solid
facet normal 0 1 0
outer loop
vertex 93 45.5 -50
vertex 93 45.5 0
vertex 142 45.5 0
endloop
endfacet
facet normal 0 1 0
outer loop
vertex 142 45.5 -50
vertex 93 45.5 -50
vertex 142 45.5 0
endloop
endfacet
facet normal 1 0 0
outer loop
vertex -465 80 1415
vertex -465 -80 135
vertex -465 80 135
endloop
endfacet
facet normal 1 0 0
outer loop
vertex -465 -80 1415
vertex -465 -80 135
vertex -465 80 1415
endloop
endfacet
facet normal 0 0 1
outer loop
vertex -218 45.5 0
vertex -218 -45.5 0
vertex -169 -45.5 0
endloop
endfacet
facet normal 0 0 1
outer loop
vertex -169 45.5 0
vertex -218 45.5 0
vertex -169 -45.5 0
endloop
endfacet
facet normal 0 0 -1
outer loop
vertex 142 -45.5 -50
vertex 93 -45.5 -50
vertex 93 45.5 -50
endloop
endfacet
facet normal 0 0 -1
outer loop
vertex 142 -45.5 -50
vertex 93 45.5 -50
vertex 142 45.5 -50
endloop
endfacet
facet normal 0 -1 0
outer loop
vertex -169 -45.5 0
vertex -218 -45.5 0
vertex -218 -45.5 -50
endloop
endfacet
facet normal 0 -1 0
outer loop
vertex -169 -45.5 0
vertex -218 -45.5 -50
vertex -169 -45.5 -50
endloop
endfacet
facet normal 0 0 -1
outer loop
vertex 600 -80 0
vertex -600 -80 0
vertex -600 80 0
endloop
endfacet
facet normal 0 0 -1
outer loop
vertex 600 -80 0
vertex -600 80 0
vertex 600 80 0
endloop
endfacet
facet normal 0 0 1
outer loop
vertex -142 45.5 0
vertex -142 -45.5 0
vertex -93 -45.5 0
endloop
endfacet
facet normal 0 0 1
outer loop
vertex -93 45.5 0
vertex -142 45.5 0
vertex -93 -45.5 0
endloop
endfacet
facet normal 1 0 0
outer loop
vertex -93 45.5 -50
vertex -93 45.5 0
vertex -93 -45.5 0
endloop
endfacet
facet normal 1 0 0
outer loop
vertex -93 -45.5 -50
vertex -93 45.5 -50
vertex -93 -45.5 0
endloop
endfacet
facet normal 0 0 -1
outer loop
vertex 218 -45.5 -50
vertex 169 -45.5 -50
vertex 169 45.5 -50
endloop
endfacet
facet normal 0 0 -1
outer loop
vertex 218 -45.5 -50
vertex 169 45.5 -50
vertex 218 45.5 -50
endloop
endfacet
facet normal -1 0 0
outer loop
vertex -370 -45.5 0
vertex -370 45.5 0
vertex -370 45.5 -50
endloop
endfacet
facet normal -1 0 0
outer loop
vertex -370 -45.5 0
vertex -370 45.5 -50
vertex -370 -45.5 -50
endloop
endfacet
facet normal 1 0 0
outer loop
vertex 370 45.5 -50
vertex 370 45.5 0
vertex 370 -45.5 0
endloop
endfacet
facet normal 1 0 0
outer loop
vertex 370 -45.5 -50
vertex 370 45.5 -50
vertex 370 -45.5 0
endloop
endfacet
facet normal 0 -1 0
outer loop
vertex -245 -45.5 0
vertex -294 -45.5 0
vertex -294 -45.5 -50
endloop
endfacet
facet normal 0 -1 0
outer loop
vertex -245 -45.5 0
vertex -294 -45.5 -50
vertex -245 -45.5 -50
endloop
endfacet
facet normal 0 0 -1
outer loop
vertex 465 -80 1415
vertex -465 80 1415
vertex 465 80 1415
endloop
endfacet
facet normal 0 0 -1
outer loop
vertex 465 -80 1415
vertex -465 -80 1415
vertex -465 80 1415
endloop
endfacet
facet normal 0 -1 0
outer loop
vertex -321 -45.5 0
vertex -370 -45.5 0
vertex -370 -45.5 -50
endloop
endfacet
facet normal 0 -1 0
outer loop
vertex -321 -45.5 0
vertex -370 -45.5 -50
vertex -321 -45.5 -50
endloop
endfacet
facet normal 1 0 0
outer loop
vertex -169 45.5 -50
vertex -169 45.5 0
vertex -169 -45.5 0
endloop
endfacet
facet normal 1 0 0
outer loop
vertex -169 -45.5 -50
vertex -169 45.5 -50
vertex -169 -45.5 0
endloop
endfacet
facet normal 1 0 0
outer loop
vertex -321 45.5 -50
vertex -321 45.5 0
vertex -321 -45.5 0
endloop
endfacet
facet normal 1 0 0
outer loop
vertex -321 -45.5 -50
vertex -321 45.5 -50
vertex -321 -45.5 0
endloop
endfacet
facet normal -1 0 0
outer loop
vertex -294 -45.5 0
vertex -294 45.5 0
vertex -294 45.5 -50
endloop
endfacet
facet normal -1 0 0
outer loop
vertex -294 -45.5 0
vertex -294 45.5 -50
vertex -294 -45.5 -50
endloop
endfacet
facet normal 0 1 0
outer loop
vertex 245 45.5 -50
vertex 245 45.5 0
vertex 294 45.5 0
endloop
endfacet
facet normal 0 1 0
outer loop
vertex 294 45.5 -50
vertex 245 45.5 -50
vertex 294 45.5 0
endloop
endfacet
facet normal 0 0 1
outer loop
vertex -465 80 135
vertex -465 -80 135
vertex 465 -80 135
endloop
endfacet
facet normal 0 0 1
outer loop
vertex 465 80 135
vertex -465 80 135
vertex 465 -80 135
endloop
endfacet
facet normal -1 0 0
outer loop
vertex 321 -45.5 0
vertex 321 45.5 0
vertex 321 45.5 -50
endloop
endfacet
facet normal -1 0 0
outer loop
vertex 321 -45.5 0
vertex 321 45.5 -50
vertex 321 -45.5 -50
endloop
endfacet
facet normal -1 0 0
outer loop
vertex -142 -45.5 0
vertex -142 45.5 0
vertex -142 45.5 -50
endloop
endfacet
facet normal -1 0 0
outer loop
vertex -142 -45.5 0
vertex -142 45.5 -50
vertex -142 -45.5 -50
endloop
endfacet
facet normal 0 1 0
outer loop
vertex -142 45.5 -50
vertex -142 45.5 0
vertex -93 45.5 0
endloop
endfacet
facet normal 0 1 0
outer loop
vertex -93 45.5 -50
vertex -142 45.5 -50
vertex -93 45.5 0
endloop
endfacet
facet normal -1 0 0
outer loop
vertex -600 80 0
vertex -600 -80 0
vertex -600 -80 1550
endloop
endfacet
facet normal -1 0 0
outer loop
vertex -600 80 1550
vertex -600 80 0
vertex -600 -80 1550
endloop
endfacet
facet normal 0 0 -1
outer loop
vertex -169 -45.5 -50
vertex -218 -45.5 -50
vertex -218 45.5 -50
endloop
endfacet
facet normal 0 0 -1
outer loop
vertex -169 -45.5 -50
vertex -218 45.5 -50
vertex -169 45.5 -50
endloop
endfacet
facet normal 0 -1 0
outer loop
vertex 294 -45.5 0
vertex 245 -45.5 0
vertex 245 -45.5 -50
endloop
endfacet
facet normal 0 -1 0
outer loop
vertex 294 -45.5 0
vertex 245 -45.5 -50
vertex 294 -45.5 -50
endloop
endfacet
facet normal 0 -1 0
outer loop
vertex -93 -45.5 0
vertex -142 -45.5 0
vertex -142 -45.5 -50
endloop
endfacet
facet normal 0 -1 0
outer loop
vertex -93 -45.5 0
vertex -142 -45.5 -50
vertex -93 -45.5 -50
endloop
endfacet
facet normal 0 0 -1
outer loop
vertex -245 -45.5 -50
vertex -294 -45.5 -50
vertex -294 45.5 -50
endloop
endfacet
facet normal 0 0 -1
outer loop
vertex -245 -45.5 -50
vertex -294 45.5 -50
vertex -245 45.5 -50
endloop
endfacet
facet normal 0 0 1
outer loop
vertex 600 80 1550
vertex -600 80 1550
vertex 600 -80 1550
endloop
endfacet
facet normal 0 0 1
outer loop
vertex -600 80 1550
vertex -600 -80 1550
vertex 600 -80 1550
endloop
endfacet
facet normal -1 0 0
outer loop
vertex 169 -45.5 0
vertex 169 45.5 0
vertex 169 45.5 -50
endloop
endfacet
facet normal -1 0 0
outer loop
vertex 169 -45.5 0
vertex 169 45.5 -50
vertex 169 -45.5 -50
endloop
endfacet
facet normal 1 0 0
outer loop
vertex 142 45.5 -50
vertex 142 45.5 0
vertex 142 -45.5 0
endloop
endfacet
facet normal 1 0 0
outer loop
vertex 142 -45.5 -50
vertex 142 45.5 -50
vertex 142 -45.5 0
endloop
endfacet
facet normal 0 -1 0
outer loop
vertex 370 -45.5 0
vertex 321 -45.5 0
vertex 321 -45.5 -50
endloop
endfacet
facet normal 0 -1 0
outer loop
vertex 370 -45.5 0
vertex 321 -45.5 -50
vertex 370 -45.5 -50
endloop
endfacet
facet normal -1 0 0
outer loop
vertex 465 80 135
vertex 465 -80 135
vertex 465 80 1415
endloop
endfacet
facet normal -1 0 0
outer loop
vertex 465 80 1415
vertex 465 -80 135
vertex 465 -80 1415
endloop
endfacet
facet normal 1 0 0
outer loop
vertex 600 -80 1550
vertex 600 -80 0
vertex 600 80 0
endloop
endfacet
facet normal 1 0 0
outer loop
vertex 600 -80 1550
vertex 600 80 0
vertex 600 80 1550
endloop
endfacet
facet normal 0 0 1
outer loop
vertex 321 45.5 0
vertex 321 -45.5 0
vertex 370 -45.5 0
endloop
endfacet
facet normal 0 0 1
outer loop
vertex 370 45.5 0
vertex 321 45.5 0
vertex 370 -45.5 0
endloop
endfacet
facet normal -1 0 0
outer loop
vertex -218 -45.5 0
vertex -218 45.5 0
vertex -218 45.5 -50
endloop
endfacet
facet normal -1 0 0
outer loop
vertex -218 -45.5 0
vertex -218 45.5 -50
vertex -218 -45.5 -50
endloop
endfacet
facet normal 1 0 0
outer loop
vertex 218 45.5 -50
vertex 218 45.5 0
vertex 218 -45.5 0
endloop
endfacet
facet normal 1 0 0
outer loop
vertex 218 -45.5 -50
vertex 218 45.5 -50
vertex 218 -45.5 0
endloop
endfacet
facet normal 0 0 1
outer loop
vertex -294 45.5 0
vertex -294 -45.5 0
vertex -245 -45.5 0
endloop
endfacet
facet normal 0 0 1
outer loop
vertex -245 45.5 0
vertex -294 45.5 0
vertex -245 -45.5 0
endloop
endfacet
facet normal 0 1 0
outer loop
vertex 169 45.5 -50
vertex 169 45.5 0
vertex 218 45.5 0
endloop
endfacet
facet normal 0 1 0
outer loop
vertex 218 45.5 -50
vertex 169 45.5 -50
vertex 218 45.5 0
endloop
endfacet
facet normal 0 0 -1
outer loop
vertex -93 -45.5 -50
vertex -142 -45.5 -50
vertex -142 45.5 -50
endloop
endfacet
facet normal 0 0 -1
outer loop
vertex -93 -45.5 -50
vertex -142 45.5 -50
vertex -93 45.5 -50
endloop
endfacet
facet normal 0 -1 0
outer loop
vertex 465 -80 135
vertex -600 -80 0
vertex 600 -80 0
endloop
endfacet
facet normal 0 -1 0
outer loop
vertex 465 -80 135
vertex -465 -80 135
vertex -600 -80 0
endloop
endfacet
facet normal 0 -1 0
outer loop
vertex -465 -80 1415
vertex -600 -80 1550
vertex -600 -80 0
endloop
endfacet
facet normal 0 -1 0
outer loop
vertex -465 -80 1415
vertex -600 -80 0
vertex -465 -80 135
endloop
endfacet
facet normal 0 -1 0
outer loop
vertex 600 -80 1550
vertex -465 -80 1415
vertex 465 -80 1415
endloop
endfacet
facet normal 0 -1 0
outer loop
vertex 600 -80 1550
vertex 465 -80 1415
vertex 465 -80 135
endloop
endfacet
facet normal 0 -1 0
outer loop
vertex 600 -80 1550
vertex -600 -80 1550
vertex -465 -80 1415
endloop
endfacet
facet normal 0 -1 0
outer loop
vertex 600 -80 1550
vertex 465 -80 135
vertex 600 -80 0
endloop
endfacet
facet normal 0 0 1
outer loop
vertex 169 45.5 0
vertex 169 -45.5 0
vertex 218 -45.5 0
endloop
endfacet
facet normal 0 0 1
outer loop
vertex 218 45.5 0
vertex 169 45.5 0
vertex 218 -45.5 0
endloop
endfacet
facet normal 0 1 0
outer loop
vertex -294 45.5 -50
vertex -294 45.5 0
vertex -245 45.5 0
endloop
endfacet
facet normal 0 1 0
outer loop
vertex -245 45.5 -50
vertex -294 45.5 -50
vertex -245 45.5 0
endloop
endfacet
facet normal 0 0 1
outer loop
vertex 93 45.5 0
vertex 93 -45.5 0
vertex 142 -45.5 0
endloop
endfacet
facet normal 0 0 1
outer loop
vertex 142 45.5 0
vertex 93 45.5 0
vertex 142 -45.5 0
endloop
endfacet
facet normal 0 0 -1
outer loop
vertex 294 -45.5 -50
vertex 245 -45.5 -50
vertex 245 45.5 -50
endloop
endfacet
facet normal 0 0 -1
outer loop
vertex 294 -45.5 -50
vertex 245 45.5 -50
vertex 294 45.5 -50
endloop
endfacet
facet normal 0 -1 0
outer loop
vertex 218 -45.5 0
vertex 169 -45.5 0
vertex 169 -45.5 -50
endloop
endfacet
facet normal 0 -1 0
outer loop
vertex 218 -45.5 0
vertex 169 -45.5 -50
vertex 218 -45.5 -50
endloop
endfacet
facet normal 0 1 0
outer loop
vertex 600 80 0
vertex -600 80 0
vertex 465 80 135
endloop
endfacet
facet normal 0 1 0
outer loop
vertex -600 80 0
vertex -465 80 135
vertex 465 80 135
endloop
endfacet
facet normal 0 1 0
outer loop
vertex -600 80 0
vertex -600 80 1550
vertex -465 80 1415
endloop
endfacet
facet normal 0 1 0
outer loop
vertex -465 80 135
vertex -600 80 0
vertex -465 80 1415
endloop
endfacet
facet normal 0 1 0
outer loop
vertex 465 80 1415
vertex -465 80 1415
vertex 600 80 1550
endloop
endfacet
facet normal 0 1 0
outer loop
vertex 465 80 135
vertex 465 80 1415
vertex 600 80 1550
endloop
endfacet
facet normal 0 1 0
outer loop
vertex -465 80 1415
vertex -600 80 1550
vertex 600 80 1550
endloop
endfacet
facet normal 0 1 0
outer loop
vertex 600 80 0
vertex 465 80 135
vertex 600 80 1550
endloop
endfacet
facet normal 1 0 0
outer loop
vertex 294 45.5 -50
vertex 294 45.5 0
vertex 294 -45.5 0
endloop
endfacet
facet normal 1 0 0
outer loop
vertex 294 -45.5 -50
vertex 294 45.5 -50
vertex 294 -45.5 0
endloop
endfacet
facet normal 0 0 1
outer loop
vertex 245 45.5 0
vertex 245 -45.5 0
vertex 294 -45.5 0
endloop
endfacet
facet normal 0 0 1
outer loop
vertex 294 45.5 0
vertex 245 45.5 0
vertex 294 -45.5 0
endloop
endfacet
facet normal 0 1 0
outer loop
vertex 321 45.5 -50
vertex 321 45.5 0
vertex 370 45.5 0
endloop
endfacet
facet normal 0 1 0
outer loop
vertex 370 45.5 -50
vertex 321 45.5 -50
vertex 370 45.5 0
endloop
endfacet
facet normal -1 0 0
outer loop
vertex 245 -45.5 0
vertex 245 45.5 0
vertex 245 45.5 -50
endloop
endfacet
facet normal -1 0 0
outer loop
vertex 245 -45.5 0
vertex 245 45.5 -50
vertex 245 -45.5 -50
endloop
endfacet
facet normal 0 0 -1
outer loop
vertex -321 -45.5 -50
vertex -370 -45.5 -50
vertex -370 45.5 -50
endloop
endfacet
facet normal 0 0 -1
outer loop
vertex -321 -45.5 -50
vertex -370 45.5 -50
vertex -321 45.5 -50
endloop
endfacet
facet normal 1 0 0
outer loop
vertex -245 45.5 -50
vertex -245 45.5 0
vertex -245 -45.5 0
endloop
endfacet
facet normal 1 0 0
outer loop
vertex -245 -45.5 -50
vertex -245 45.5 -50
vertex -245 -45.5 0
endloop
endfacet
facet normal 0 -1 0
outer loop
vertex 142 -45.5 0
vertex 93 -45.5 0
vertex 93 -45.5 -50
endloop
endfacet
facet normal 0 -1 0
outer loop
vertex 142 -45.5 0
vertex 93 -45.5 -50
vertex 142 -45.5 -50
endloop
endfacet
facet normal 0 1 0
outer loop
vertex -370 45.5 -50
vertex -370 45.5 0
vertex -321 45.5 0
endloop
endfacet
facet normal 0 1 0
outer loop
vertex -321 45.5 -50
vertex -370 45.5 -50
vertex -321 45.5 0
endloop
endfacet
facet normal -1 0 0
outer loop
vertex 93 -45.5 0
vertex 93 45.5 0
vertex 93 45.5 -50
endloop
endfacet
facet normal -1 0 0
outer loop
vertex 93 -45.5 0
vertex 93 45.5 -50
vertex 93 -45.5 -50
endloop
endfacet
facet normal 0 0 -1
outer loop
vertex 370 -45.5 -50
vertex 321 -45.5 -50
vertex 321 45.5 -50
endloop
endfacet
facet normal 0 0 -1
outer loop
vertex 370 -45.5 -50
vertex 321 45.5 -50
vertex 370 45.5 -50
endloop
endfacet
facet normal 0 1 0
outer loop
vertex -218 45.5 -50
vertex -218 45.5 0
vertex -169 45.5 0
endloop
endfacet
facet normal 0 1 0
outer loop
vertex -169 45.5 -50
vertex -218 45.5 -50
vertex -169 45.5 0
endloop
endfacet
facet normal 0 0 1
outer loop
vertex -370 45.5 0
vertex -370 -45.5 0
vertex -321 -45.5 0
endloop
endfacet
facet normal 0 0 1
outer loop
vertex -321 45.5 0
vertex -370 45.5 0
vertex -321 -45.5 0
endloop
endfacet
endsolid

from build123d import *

# Parameters (mm, degrees)
F0_W     = 1200
F0_H     = 1550
F0_W_2   = 930
F0_H_2   = 1280
F1_DEPTH = 80
F2_W     = 49
F2_H     = 91
F3_DEPTH = 50


with BuildPart() as f1:
    # F0 (on Front) → F1 (new body, symmetric)
    with BuildSketch(Plane.XZ):
        with Locations((0, 775)):
            Rectangle(F0_W, F0_H)
        with Locations((0, 775)):
            Rectangle(F0_W_2, F0_H_2, mode=Mode.SUBTRACT)
    extrude(amount=F1_DEPTH, both=True)


with BuildPart() as f3:
    # F2 (on face) → F3 (new body)
    with BuildSketch(Plane(origin=(0, 0, 0), x_dir=(1, 0, 0), z_dir=(0, 0, -1))):
        with Locations((-345.5, 0)):
            Rectangle(F2_W, F2_H)
        with Locations((-269.5, 0)):
            Rectangle(F2_W, F2_H)
        with Locations((-193.5, 0)):
            Rectangle(F2_W, F2_H)
        with Locations((-117.5, 0)):
            Rectangle(F2_W, F2_H)
        with Locations((345.5, 0)):
            Rectangle(F2_W, F2_H)
        with Locations((117.5, 0)):
            Rectangle(F2_W, F2_H)
        with Locations((193.5, 0)):
            Rectangle(F2_W, F2_H)
        with Locations((269.5, 0)):
            Rectangle(F2_W, F2_H)
    extrude(amount=F3_DEPTH)


solid = Compound([f1.part, f3.part])
